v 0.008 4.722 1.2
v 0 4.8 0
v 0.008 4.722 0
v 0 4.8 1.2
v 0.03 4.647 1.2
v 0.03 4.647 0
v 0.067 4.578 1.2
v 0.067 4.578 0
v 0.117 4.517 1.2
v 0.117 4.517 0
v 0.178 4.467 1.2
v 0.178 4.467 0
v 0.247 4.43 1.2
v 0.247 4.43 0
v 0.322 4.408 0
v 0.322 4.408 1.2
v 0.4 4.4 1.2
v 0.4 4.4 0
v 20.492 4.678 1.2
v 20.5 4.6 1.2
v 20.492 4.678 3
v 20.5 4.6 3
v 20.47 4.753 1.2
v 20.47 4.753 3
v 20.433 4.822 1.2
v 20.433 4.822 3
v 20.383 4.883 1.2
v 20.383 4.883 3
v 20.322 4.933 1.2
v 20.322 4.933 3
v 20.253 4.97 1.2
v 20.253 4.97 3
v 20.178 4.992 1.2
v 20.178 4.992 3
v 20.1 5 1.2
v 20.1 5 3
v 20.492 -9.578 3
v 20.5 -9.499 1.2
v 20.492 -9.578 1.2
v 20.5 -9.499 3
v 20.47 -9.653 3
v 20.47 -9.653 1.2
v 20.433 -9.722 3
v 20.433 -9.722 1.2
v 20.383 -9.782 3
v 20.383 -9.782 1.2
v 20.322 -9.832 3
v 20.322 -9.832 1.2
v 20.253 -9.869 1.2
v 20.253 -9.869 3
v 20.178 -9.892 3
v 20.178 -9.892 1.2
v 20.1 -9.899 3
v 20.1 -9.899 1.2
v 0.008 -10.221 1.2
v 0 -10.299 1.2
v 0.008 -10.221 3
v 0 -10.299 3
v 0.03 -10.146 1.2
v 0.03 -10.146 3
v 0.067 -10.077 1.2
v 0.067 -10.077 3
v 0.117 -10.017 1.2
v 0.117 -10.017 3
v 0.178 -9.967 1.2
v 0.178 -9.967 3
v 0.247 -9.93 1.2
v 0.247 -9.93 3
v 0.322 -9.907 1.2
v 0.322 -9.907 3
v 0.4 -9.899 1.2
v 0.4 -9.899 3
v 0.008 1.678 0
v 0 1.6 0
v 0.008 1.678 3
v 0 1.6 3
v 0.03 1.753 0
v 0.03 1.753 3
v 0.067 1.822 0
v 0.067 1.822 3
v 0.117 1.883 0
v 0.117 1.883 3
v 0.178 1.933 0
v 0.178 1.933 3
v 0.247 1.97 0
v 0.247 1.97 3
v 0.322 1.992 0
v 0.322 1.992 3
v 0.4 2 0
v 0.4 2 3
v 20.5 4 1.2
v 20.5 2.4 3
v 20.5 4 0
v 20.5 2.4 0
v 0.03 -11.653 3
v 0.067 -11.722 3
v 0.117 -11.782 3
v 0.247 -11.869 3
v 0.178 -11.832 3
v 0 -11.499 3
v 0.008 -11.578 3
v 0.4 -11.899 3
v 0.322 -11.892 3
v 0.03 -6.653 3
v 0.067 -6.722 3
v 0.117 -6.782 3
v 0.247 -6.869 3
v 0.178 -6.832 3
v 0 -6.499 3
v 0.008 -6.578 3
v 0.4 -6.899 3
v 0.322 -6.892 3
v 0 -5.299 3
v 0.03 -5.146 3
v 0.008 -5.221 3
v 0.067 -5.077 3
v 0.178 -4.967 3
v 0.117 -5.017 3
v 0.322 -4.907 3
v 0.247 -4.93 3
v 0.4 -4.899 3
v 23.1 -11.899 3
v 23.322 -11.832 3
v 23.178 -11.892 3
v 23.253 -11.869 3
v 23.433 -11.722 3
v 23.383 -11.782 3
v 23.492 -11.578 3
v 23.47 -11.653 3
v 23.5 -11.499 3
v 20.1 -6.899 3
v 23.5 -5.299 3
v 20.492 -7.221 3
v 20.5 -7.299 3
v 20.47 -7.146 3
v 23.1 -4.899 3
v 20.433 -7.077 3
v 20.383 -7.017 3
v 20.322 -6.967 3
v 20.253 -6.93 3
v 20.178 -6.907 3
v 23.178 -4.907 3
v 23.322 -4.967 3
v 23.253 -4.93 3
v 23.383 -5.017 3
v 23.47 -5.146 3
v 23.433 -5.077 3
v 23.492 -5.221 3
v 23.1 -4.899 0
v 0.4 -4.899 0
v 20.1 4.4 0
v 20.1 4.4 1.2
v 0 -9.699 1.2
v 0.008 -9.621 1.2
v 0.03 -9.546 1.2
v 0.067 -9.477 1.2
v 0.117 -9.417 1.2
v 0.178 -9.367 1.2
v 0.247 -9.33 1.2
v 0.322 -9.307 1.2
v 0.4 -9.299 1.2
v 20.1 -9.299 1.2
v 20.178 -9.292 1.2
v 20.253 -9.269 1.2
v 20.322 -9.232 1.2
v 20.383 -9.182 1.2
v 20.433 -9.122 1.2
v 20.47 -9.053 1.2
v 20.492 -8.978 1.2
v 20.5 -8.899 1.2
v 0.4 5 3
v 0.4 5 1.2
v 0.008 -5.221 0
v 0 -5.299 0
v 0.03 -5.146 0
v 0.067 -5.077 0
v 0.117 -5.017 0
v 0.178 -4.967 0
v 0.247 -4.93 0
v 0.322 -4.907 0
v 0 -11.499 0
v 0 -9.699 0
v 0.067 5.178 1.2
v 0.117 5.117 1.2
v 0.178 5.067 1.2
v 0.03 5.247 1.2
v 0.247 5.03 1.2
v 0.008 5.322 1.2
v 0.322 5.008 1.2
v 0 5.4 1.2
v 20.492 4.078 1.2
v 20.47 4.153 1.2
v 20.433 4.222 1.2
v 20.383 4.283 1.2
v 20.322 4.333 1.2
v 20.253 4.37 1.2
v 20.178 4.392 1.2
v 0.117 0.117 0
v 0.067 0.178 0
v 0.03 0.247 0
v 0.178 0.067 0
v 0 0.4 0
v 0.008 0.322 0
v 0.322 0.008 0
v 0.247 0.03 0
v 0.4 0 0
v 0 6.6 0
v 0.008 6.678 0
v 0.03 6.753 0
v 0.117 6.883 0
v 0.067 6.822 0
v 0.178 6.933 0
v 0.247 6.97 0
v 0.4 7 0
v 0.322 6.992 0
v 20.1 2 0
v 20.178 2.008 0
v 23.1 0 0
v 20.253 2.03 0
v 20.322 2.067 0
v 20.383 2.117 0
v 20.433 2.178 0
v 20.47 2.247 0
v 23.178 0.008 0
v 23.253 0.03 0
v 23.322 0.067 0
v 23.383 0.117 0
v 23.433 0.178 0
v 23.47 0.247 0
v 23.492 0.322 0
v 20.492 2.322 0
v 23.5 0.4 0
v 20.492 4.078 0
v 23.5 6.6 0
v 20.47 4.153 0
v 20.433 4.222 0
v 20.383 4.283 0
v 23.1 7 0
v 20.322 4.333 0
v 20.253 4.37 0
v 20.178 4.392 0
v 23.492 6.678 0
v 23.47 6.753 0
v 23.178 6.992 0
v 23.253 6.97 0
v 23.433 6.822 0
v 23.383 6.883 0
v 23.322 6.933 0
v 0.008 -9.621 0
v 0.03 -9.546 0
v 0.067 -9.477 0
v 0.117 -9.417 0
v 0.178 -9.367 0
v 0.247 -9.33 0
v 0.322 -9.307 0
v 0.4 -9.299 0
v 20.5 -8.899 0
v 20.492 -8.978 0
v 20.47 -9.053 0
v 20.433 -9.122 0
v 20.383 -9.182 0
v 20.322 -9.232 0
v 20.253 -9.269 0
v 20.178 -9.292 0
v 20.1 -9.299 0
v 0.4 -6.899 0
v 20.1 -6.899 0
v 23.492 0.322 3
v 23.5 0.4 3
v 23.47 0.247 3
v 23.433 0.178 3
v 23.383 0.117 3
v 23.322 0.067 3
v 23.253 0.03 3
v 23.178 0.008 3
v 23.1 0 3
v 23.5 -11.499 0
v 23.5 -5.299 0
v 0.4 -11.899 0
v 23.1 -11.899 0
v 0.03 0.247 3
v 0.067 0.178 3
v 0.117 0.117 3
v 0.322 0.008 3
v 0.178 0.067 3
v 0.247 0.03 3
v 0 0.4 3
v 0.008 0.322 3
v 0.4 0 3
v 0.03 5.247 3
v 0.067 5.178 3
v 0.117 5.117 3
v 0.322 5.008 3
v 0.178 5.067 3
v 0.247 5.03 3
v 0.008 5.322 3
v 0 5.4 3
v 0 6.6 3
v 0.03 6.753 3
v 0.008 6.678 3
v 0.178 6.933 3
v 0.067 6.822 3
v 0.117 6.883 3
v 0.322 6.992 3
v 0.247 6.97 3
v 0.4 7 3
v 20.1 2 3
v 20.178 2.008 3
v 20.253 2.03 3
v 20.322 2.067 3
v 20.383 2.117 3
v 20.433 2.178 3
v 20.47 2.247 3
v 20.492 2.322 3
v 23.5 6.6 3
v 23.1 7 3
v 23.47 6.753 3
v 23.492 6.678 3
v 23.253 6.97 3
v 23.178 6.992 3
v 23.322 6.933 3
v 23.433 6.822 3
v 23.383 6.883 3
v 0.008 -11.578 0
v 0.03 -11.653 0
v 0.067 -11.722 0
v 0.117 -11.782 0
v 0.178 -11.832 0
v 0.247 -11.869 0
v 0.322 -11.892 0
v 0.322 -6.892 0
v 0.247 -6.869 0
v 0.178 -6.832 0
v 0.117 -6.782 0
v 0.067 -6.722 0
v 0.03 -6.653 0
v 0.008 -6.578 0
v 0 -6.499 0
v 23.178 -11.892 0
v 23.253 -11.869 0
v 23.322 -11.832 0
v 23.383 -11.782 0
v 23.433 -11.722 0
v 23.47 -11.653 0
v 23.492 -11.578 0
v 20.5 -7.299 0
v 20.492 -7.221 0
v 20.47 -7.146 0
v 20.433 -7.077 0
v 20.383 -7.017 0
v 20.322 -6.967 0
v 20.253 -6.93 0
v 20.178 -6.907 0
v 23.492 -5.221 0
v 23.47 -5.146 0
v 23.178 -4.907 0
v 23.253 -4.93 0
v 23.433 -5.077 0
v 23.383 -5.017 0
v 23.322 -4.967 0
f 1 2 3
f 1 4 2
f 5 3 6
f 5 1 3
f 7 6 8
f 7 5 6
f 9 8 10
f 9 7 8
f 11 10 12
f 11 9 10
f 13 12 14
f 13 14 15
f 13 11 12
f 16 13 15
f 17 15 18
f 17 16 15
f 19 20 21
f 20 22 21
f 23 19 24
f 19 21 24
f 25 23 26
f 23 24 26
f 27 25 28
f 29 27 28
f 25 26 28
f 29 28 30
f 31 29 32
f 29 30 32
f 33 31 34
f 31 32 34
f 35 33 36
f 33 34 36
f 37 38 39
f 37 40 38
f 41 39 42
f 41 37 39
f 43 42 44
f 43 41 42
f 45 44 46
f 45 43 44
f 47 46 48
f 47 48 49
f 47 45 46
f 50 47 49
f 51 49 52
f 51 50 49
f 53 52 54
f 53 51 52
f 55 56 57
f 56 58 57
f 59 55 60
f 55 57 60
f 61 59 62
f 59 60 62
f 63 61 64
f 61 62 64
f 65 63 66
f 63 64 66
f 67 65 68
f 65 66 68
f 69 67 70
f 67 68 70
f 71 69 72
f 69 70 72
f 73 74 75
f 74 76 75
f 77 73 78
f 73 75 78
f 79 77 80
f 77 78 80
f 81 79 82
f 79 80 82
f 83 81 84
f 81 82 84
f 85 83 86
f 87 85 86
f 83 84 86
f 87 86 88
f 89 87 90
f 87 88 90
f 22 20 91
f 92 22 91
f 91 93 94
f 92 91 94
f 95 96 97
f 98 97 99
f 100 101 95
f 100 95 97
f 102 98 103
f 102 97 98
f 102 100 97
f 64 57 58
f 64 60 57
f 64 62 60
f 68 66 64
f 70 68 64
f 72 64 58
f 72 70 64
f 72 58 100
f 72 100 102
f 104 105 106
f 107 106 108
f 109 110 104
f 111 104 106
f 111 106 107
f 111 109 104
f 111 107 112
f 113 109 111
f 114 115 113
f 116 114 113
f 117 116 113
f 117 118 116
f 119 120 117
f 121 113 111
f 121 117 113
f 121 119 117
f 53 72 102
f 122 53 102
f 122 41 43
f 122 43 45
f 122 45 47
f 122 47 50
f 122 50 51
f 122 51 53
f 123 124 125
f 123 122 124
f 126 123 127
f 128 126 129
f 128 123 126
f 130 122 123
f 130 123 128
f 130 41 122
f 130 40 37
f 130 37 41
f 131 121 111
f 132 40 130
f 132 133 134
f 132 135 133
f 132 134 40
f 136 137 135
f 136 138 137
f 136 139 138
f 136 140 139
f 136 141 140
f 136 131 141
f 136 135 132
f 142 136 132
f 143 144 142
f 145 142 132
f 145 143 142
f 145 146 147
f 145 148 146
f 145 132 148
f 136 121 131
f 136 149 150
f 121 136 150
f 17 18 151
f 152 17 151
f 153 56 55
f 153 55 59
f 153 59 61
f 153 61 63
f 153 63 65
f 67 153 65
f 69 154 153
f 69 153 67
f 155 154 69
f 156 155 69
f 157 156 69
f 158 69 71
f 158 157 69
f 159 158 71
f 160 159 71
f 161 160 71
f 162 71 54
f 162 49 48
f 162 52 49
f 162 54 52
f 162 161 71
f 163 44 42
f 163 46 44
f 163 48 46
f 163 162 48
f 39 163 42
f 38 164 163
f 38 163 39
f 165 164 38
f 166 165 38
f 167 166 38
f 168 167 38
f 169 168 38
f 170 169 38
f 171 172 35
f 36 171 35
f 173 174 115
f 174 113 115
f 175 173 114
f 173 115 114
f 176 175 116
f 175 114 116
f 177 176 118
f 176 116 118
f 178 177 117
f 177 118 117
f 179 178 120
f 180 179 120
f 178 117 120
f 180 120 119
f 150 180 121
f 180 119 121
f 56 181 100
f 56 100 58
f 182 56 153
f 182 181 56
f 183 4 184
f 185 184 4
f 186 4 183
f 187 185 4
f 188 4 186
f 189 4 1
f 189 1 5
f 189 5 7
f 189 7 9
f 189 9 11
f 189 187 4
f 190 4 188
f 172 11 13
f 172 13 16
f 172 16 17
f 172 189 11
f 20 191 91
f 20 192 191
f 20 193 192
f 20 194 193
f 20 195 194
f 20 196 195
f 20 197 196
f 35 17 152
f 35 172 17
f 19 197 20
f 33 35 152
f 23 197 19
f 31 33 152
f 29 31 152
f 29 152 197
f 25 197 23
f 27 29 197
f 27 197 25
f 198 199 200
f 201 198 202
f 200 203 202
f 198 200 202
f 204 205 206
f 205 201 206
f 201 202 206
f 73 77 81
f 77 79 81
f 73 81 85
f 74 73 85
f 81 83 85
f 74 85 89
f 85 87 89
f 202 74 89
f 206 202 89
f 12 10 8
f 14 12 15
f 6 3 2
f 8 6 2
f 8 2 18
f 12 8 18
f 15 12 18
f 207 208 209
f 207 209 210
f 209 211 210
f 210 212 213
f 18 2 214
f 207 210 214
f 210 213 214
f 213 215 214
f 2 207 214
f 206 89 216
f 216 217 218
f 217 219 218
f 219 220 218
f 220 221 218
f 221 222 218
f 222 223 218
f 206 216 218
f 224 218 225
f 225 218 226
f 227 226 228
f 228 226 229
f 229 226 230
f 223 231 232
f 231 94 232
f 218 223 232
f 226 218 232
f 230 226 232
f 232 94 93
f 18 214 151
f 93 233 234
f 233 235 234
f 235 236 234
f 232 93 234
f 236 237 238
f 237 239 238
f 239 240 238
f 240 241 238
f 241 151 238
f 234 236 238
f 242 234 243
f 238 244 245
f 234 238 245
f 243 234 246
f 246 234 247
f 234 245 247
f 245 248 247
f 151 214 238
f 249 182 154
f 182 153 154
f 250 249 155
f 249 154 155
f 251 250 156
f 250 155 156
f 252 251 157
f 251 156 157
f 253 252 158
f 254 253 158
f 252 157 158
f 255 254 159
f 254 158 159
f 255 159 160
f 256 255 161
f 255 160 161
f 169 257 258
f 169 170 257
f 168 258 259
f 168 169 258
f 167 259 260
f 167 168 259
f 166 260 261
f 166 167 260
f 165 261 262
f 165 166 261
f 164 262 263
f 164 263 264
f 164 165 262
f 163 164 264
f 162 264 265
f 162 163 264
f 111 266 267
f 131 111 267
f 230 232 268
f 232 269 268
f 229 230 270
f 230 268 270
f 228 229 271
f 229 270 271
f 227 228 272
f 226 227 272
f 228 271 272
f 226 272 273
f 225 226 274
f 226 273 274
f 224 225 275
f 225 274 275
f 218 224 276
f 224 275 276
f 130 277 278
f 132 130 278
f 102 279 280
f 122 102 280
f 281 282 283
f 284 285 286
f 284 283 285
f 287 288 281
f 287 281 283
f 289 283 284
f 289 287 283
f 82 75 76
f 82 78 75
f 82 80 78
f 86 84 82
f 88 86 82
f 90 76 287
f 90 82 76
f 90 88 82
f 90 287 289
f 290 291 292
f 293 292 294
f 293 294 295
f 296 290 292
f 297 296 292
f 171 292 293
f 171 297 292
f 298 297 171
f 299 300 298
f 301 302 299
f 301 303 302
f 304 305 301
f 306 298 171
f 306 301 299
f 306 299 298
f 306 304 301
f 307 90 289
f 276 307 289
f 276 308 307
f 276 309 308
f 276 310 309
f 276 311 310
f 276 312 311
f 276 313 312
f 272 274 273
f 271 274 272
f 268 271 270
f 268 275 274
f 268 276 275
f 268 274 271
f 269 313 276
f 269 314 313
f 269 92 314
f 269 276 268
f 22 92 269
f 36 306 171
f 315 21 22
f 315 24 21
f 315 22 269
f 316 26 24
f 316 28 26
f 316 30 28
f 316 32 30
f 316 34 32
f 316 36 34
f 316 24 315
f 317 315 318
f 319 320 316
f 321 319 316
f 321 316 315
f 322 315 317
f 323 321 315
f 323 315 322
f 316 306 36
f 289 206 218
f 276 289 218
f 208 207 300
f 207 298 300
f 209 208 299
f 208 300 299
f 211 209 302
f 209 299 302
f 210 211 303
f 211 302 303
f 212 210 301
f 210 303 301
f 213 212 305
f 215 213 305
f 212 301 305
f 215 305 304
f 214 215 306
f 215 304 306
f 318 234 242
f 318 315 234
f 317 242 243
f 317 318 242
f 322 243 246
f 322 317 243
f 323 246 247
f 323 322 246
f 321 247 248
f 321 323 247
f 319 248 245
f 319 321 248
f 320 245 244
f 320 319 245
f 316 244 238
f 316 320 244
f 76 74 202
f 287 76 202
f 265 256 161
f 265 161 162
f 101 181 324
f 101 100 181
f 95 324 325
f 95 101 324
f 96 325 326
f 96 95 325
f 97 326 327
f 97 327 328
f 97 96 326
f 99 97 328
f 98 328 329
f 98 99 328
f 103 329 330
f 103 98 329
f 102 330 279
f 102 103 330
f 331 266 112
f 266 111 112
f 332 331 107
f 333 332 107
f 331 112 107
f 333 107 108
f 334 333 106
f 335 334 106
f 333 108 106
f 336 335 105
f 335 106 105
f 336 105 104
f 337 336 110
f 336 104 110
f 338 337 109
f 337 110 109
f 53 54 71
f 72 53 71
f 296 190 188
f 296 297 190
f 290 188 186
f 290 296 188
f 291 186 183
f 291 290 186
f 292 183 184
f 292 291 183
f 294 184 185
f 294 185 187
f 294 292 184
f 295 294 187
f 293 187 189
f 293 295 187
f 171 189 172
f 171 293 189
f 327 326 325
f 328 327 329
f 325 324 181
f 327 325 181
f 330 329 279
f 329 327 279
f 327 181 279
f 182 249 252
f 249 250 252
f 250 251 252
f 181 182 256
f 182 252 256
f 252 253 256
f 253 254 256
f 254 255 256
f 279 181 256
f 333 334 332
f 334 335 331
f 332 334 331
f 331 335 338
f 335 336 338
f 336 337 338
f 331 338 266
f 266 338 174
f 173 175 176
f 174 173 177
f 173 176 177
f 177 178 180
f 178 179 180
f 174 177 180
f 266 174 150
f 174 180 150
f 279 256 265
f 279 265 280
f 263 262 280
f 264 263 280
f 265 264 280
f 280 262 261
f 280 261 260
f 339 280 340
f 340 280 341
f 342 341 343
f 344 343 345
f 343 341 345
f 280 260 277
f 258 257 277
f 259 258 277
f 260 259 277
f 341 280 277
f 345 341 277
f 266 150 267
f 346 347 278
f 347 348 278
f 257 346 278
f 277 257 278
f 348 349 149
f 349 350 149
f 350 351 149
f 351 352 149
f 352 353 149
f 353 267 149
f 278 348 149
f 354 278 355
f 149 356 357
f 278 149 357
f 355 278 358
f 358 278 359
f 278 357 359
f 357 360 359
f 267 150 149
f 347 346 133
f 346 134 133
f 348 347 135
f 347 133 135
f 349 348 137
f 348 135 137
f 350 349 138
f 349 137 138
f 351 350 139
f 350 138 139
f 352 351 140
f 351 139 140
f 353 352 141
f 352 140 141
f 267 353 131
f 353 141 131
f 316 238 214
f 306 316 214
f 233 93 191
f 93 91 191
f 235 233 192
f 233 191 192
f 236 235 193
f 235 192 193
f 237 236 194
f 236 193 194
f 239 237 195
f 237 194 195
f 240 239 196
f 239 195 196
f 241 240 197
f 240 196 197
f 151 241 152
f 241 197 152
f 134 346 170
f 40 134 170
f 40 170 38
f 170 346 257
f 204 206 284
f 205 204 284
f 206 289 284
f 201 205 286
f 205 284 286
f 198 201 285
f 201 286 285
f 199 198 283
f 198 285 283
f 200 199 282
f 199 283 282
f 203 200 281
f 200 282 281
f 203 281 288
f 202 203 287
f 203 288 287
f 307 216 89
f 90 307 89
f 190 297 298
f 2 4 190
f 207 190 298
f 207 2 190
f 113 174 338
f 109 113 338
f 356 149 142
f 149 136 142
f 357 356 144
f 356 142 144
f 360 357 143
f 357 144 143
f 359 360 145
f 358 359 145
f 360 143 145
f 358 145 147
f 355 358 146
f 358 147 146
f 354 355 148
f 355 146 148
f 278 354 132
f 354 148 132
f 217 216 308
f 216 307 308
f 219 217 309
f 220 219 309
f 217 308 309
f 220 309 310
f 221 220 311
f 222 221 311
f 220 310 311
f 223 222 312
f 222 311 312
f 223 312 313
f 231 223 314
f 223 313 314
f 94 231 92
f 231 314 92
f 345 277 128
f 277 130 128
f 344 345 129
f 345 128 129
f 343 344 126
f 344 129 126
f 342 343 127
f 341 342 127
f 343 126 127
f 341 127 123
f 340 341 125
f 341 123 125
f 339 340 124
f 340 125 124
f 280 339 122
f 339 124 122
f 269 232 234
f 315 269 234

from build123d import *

# Parameters (mm, degrees)
BOSS_EXTRUDE1_DEPTH   = 3
BOSS_EXTRUDE1_2_DEPTH = 3
SKETCH2_4_W           = 20.5
SKETCH2_4_H           = 0.6
BOSS_EXTRUDE3_DEPTH   = 1.2
FILLET2_R             = 0.4
FILLET3_R             = 0.4


with BuildPart() as part:
    # Sketch2 → Boss-Extrude1 (new body)
    with BuildSketch(Plane.XY):
        Polygon((0, 2), (0, 0), (23.5, 0), (23.5, 7), (0, 7), (0, 5), (20.5, 5), (20.5, 2), align=None)
    extrude(amount=BOSS_EXTRUDE1_DEPTH)



with BuildPart() as body_2:
    # Sketch2 → Boss-Extrude1 2 (new body)
    with BuildSketch(Plane.XY):
        Polygon((20.5, -6.899471306), (20.5, -9.899471306), (0, -9.899471306), (0, -11.899471306), (23.5, -11.899471306), (23.5, -4.899471306), (0, -4.899471306), (0, -6.899471306), align=None)
    extrude(amount=BOSS_EXTRUDE1_2_DEPTH)


with BuildPart() as part_1:
    add(part.part)

    add(body_2.part)  # Boss-Extrude3 merges body 2
    # Sketch2<4> → Boss-Extrude3 (add)
    with BuildSketch(Plane.XY):
        with Locations((10.25, 4.7)):
            Rectangle(SKETCH2_4_W, SKETCH2_4_H)
        with Locations((10.25, -9.599471306)):
            Rectangle(SKETCH2_4_W, SKETCH2_4_H)
    extrude(amount=BOSS_EXTRUDE3_DEPTH)

    # Fillet2
    fillet2_edges = [part_1.edges().sort_by_distance(p)[0] for p in [
        (0, 5, 2.1),
        (20.5, 2, 1.5),
        (20.5, 4.4, 0.6),
        (20.5, 5, 2.1),
        (23.5, 7, 1.5),
        (23.5, 0, 1.5),
        (0, 0, 1.5),
        (0, 2, 1.5),
        (0, 4.4, 0.6),
        (0, 7, 1.5),
    ]]
    fillet(fillet2_edges, radius=FILLET2_R)

    # Fillet3
    fillet3_edges = [part_1.edges().sort_by_distance(p)[0] for p in [
        (23.5, -11.899471306, 1.5),
        (23.5, -4.899471306, 1.5),
        (20.5, -6.899471306, 1.5),
        (20.5, -9.899471306, 2.1),
        (20.5, -9.299471306, 0.6),
        (0, -11.899471306, 1.5),
        (0, -9.899471306, 2.1),
        (0, -9.299471306, 0.6),
        (0, -4.899471306, 1.5),
        (0, -6.899471306, 1.5),
    ]]
    fillet(fillet3_edges, radius=FILLET3_R)


solid = part_1.part
